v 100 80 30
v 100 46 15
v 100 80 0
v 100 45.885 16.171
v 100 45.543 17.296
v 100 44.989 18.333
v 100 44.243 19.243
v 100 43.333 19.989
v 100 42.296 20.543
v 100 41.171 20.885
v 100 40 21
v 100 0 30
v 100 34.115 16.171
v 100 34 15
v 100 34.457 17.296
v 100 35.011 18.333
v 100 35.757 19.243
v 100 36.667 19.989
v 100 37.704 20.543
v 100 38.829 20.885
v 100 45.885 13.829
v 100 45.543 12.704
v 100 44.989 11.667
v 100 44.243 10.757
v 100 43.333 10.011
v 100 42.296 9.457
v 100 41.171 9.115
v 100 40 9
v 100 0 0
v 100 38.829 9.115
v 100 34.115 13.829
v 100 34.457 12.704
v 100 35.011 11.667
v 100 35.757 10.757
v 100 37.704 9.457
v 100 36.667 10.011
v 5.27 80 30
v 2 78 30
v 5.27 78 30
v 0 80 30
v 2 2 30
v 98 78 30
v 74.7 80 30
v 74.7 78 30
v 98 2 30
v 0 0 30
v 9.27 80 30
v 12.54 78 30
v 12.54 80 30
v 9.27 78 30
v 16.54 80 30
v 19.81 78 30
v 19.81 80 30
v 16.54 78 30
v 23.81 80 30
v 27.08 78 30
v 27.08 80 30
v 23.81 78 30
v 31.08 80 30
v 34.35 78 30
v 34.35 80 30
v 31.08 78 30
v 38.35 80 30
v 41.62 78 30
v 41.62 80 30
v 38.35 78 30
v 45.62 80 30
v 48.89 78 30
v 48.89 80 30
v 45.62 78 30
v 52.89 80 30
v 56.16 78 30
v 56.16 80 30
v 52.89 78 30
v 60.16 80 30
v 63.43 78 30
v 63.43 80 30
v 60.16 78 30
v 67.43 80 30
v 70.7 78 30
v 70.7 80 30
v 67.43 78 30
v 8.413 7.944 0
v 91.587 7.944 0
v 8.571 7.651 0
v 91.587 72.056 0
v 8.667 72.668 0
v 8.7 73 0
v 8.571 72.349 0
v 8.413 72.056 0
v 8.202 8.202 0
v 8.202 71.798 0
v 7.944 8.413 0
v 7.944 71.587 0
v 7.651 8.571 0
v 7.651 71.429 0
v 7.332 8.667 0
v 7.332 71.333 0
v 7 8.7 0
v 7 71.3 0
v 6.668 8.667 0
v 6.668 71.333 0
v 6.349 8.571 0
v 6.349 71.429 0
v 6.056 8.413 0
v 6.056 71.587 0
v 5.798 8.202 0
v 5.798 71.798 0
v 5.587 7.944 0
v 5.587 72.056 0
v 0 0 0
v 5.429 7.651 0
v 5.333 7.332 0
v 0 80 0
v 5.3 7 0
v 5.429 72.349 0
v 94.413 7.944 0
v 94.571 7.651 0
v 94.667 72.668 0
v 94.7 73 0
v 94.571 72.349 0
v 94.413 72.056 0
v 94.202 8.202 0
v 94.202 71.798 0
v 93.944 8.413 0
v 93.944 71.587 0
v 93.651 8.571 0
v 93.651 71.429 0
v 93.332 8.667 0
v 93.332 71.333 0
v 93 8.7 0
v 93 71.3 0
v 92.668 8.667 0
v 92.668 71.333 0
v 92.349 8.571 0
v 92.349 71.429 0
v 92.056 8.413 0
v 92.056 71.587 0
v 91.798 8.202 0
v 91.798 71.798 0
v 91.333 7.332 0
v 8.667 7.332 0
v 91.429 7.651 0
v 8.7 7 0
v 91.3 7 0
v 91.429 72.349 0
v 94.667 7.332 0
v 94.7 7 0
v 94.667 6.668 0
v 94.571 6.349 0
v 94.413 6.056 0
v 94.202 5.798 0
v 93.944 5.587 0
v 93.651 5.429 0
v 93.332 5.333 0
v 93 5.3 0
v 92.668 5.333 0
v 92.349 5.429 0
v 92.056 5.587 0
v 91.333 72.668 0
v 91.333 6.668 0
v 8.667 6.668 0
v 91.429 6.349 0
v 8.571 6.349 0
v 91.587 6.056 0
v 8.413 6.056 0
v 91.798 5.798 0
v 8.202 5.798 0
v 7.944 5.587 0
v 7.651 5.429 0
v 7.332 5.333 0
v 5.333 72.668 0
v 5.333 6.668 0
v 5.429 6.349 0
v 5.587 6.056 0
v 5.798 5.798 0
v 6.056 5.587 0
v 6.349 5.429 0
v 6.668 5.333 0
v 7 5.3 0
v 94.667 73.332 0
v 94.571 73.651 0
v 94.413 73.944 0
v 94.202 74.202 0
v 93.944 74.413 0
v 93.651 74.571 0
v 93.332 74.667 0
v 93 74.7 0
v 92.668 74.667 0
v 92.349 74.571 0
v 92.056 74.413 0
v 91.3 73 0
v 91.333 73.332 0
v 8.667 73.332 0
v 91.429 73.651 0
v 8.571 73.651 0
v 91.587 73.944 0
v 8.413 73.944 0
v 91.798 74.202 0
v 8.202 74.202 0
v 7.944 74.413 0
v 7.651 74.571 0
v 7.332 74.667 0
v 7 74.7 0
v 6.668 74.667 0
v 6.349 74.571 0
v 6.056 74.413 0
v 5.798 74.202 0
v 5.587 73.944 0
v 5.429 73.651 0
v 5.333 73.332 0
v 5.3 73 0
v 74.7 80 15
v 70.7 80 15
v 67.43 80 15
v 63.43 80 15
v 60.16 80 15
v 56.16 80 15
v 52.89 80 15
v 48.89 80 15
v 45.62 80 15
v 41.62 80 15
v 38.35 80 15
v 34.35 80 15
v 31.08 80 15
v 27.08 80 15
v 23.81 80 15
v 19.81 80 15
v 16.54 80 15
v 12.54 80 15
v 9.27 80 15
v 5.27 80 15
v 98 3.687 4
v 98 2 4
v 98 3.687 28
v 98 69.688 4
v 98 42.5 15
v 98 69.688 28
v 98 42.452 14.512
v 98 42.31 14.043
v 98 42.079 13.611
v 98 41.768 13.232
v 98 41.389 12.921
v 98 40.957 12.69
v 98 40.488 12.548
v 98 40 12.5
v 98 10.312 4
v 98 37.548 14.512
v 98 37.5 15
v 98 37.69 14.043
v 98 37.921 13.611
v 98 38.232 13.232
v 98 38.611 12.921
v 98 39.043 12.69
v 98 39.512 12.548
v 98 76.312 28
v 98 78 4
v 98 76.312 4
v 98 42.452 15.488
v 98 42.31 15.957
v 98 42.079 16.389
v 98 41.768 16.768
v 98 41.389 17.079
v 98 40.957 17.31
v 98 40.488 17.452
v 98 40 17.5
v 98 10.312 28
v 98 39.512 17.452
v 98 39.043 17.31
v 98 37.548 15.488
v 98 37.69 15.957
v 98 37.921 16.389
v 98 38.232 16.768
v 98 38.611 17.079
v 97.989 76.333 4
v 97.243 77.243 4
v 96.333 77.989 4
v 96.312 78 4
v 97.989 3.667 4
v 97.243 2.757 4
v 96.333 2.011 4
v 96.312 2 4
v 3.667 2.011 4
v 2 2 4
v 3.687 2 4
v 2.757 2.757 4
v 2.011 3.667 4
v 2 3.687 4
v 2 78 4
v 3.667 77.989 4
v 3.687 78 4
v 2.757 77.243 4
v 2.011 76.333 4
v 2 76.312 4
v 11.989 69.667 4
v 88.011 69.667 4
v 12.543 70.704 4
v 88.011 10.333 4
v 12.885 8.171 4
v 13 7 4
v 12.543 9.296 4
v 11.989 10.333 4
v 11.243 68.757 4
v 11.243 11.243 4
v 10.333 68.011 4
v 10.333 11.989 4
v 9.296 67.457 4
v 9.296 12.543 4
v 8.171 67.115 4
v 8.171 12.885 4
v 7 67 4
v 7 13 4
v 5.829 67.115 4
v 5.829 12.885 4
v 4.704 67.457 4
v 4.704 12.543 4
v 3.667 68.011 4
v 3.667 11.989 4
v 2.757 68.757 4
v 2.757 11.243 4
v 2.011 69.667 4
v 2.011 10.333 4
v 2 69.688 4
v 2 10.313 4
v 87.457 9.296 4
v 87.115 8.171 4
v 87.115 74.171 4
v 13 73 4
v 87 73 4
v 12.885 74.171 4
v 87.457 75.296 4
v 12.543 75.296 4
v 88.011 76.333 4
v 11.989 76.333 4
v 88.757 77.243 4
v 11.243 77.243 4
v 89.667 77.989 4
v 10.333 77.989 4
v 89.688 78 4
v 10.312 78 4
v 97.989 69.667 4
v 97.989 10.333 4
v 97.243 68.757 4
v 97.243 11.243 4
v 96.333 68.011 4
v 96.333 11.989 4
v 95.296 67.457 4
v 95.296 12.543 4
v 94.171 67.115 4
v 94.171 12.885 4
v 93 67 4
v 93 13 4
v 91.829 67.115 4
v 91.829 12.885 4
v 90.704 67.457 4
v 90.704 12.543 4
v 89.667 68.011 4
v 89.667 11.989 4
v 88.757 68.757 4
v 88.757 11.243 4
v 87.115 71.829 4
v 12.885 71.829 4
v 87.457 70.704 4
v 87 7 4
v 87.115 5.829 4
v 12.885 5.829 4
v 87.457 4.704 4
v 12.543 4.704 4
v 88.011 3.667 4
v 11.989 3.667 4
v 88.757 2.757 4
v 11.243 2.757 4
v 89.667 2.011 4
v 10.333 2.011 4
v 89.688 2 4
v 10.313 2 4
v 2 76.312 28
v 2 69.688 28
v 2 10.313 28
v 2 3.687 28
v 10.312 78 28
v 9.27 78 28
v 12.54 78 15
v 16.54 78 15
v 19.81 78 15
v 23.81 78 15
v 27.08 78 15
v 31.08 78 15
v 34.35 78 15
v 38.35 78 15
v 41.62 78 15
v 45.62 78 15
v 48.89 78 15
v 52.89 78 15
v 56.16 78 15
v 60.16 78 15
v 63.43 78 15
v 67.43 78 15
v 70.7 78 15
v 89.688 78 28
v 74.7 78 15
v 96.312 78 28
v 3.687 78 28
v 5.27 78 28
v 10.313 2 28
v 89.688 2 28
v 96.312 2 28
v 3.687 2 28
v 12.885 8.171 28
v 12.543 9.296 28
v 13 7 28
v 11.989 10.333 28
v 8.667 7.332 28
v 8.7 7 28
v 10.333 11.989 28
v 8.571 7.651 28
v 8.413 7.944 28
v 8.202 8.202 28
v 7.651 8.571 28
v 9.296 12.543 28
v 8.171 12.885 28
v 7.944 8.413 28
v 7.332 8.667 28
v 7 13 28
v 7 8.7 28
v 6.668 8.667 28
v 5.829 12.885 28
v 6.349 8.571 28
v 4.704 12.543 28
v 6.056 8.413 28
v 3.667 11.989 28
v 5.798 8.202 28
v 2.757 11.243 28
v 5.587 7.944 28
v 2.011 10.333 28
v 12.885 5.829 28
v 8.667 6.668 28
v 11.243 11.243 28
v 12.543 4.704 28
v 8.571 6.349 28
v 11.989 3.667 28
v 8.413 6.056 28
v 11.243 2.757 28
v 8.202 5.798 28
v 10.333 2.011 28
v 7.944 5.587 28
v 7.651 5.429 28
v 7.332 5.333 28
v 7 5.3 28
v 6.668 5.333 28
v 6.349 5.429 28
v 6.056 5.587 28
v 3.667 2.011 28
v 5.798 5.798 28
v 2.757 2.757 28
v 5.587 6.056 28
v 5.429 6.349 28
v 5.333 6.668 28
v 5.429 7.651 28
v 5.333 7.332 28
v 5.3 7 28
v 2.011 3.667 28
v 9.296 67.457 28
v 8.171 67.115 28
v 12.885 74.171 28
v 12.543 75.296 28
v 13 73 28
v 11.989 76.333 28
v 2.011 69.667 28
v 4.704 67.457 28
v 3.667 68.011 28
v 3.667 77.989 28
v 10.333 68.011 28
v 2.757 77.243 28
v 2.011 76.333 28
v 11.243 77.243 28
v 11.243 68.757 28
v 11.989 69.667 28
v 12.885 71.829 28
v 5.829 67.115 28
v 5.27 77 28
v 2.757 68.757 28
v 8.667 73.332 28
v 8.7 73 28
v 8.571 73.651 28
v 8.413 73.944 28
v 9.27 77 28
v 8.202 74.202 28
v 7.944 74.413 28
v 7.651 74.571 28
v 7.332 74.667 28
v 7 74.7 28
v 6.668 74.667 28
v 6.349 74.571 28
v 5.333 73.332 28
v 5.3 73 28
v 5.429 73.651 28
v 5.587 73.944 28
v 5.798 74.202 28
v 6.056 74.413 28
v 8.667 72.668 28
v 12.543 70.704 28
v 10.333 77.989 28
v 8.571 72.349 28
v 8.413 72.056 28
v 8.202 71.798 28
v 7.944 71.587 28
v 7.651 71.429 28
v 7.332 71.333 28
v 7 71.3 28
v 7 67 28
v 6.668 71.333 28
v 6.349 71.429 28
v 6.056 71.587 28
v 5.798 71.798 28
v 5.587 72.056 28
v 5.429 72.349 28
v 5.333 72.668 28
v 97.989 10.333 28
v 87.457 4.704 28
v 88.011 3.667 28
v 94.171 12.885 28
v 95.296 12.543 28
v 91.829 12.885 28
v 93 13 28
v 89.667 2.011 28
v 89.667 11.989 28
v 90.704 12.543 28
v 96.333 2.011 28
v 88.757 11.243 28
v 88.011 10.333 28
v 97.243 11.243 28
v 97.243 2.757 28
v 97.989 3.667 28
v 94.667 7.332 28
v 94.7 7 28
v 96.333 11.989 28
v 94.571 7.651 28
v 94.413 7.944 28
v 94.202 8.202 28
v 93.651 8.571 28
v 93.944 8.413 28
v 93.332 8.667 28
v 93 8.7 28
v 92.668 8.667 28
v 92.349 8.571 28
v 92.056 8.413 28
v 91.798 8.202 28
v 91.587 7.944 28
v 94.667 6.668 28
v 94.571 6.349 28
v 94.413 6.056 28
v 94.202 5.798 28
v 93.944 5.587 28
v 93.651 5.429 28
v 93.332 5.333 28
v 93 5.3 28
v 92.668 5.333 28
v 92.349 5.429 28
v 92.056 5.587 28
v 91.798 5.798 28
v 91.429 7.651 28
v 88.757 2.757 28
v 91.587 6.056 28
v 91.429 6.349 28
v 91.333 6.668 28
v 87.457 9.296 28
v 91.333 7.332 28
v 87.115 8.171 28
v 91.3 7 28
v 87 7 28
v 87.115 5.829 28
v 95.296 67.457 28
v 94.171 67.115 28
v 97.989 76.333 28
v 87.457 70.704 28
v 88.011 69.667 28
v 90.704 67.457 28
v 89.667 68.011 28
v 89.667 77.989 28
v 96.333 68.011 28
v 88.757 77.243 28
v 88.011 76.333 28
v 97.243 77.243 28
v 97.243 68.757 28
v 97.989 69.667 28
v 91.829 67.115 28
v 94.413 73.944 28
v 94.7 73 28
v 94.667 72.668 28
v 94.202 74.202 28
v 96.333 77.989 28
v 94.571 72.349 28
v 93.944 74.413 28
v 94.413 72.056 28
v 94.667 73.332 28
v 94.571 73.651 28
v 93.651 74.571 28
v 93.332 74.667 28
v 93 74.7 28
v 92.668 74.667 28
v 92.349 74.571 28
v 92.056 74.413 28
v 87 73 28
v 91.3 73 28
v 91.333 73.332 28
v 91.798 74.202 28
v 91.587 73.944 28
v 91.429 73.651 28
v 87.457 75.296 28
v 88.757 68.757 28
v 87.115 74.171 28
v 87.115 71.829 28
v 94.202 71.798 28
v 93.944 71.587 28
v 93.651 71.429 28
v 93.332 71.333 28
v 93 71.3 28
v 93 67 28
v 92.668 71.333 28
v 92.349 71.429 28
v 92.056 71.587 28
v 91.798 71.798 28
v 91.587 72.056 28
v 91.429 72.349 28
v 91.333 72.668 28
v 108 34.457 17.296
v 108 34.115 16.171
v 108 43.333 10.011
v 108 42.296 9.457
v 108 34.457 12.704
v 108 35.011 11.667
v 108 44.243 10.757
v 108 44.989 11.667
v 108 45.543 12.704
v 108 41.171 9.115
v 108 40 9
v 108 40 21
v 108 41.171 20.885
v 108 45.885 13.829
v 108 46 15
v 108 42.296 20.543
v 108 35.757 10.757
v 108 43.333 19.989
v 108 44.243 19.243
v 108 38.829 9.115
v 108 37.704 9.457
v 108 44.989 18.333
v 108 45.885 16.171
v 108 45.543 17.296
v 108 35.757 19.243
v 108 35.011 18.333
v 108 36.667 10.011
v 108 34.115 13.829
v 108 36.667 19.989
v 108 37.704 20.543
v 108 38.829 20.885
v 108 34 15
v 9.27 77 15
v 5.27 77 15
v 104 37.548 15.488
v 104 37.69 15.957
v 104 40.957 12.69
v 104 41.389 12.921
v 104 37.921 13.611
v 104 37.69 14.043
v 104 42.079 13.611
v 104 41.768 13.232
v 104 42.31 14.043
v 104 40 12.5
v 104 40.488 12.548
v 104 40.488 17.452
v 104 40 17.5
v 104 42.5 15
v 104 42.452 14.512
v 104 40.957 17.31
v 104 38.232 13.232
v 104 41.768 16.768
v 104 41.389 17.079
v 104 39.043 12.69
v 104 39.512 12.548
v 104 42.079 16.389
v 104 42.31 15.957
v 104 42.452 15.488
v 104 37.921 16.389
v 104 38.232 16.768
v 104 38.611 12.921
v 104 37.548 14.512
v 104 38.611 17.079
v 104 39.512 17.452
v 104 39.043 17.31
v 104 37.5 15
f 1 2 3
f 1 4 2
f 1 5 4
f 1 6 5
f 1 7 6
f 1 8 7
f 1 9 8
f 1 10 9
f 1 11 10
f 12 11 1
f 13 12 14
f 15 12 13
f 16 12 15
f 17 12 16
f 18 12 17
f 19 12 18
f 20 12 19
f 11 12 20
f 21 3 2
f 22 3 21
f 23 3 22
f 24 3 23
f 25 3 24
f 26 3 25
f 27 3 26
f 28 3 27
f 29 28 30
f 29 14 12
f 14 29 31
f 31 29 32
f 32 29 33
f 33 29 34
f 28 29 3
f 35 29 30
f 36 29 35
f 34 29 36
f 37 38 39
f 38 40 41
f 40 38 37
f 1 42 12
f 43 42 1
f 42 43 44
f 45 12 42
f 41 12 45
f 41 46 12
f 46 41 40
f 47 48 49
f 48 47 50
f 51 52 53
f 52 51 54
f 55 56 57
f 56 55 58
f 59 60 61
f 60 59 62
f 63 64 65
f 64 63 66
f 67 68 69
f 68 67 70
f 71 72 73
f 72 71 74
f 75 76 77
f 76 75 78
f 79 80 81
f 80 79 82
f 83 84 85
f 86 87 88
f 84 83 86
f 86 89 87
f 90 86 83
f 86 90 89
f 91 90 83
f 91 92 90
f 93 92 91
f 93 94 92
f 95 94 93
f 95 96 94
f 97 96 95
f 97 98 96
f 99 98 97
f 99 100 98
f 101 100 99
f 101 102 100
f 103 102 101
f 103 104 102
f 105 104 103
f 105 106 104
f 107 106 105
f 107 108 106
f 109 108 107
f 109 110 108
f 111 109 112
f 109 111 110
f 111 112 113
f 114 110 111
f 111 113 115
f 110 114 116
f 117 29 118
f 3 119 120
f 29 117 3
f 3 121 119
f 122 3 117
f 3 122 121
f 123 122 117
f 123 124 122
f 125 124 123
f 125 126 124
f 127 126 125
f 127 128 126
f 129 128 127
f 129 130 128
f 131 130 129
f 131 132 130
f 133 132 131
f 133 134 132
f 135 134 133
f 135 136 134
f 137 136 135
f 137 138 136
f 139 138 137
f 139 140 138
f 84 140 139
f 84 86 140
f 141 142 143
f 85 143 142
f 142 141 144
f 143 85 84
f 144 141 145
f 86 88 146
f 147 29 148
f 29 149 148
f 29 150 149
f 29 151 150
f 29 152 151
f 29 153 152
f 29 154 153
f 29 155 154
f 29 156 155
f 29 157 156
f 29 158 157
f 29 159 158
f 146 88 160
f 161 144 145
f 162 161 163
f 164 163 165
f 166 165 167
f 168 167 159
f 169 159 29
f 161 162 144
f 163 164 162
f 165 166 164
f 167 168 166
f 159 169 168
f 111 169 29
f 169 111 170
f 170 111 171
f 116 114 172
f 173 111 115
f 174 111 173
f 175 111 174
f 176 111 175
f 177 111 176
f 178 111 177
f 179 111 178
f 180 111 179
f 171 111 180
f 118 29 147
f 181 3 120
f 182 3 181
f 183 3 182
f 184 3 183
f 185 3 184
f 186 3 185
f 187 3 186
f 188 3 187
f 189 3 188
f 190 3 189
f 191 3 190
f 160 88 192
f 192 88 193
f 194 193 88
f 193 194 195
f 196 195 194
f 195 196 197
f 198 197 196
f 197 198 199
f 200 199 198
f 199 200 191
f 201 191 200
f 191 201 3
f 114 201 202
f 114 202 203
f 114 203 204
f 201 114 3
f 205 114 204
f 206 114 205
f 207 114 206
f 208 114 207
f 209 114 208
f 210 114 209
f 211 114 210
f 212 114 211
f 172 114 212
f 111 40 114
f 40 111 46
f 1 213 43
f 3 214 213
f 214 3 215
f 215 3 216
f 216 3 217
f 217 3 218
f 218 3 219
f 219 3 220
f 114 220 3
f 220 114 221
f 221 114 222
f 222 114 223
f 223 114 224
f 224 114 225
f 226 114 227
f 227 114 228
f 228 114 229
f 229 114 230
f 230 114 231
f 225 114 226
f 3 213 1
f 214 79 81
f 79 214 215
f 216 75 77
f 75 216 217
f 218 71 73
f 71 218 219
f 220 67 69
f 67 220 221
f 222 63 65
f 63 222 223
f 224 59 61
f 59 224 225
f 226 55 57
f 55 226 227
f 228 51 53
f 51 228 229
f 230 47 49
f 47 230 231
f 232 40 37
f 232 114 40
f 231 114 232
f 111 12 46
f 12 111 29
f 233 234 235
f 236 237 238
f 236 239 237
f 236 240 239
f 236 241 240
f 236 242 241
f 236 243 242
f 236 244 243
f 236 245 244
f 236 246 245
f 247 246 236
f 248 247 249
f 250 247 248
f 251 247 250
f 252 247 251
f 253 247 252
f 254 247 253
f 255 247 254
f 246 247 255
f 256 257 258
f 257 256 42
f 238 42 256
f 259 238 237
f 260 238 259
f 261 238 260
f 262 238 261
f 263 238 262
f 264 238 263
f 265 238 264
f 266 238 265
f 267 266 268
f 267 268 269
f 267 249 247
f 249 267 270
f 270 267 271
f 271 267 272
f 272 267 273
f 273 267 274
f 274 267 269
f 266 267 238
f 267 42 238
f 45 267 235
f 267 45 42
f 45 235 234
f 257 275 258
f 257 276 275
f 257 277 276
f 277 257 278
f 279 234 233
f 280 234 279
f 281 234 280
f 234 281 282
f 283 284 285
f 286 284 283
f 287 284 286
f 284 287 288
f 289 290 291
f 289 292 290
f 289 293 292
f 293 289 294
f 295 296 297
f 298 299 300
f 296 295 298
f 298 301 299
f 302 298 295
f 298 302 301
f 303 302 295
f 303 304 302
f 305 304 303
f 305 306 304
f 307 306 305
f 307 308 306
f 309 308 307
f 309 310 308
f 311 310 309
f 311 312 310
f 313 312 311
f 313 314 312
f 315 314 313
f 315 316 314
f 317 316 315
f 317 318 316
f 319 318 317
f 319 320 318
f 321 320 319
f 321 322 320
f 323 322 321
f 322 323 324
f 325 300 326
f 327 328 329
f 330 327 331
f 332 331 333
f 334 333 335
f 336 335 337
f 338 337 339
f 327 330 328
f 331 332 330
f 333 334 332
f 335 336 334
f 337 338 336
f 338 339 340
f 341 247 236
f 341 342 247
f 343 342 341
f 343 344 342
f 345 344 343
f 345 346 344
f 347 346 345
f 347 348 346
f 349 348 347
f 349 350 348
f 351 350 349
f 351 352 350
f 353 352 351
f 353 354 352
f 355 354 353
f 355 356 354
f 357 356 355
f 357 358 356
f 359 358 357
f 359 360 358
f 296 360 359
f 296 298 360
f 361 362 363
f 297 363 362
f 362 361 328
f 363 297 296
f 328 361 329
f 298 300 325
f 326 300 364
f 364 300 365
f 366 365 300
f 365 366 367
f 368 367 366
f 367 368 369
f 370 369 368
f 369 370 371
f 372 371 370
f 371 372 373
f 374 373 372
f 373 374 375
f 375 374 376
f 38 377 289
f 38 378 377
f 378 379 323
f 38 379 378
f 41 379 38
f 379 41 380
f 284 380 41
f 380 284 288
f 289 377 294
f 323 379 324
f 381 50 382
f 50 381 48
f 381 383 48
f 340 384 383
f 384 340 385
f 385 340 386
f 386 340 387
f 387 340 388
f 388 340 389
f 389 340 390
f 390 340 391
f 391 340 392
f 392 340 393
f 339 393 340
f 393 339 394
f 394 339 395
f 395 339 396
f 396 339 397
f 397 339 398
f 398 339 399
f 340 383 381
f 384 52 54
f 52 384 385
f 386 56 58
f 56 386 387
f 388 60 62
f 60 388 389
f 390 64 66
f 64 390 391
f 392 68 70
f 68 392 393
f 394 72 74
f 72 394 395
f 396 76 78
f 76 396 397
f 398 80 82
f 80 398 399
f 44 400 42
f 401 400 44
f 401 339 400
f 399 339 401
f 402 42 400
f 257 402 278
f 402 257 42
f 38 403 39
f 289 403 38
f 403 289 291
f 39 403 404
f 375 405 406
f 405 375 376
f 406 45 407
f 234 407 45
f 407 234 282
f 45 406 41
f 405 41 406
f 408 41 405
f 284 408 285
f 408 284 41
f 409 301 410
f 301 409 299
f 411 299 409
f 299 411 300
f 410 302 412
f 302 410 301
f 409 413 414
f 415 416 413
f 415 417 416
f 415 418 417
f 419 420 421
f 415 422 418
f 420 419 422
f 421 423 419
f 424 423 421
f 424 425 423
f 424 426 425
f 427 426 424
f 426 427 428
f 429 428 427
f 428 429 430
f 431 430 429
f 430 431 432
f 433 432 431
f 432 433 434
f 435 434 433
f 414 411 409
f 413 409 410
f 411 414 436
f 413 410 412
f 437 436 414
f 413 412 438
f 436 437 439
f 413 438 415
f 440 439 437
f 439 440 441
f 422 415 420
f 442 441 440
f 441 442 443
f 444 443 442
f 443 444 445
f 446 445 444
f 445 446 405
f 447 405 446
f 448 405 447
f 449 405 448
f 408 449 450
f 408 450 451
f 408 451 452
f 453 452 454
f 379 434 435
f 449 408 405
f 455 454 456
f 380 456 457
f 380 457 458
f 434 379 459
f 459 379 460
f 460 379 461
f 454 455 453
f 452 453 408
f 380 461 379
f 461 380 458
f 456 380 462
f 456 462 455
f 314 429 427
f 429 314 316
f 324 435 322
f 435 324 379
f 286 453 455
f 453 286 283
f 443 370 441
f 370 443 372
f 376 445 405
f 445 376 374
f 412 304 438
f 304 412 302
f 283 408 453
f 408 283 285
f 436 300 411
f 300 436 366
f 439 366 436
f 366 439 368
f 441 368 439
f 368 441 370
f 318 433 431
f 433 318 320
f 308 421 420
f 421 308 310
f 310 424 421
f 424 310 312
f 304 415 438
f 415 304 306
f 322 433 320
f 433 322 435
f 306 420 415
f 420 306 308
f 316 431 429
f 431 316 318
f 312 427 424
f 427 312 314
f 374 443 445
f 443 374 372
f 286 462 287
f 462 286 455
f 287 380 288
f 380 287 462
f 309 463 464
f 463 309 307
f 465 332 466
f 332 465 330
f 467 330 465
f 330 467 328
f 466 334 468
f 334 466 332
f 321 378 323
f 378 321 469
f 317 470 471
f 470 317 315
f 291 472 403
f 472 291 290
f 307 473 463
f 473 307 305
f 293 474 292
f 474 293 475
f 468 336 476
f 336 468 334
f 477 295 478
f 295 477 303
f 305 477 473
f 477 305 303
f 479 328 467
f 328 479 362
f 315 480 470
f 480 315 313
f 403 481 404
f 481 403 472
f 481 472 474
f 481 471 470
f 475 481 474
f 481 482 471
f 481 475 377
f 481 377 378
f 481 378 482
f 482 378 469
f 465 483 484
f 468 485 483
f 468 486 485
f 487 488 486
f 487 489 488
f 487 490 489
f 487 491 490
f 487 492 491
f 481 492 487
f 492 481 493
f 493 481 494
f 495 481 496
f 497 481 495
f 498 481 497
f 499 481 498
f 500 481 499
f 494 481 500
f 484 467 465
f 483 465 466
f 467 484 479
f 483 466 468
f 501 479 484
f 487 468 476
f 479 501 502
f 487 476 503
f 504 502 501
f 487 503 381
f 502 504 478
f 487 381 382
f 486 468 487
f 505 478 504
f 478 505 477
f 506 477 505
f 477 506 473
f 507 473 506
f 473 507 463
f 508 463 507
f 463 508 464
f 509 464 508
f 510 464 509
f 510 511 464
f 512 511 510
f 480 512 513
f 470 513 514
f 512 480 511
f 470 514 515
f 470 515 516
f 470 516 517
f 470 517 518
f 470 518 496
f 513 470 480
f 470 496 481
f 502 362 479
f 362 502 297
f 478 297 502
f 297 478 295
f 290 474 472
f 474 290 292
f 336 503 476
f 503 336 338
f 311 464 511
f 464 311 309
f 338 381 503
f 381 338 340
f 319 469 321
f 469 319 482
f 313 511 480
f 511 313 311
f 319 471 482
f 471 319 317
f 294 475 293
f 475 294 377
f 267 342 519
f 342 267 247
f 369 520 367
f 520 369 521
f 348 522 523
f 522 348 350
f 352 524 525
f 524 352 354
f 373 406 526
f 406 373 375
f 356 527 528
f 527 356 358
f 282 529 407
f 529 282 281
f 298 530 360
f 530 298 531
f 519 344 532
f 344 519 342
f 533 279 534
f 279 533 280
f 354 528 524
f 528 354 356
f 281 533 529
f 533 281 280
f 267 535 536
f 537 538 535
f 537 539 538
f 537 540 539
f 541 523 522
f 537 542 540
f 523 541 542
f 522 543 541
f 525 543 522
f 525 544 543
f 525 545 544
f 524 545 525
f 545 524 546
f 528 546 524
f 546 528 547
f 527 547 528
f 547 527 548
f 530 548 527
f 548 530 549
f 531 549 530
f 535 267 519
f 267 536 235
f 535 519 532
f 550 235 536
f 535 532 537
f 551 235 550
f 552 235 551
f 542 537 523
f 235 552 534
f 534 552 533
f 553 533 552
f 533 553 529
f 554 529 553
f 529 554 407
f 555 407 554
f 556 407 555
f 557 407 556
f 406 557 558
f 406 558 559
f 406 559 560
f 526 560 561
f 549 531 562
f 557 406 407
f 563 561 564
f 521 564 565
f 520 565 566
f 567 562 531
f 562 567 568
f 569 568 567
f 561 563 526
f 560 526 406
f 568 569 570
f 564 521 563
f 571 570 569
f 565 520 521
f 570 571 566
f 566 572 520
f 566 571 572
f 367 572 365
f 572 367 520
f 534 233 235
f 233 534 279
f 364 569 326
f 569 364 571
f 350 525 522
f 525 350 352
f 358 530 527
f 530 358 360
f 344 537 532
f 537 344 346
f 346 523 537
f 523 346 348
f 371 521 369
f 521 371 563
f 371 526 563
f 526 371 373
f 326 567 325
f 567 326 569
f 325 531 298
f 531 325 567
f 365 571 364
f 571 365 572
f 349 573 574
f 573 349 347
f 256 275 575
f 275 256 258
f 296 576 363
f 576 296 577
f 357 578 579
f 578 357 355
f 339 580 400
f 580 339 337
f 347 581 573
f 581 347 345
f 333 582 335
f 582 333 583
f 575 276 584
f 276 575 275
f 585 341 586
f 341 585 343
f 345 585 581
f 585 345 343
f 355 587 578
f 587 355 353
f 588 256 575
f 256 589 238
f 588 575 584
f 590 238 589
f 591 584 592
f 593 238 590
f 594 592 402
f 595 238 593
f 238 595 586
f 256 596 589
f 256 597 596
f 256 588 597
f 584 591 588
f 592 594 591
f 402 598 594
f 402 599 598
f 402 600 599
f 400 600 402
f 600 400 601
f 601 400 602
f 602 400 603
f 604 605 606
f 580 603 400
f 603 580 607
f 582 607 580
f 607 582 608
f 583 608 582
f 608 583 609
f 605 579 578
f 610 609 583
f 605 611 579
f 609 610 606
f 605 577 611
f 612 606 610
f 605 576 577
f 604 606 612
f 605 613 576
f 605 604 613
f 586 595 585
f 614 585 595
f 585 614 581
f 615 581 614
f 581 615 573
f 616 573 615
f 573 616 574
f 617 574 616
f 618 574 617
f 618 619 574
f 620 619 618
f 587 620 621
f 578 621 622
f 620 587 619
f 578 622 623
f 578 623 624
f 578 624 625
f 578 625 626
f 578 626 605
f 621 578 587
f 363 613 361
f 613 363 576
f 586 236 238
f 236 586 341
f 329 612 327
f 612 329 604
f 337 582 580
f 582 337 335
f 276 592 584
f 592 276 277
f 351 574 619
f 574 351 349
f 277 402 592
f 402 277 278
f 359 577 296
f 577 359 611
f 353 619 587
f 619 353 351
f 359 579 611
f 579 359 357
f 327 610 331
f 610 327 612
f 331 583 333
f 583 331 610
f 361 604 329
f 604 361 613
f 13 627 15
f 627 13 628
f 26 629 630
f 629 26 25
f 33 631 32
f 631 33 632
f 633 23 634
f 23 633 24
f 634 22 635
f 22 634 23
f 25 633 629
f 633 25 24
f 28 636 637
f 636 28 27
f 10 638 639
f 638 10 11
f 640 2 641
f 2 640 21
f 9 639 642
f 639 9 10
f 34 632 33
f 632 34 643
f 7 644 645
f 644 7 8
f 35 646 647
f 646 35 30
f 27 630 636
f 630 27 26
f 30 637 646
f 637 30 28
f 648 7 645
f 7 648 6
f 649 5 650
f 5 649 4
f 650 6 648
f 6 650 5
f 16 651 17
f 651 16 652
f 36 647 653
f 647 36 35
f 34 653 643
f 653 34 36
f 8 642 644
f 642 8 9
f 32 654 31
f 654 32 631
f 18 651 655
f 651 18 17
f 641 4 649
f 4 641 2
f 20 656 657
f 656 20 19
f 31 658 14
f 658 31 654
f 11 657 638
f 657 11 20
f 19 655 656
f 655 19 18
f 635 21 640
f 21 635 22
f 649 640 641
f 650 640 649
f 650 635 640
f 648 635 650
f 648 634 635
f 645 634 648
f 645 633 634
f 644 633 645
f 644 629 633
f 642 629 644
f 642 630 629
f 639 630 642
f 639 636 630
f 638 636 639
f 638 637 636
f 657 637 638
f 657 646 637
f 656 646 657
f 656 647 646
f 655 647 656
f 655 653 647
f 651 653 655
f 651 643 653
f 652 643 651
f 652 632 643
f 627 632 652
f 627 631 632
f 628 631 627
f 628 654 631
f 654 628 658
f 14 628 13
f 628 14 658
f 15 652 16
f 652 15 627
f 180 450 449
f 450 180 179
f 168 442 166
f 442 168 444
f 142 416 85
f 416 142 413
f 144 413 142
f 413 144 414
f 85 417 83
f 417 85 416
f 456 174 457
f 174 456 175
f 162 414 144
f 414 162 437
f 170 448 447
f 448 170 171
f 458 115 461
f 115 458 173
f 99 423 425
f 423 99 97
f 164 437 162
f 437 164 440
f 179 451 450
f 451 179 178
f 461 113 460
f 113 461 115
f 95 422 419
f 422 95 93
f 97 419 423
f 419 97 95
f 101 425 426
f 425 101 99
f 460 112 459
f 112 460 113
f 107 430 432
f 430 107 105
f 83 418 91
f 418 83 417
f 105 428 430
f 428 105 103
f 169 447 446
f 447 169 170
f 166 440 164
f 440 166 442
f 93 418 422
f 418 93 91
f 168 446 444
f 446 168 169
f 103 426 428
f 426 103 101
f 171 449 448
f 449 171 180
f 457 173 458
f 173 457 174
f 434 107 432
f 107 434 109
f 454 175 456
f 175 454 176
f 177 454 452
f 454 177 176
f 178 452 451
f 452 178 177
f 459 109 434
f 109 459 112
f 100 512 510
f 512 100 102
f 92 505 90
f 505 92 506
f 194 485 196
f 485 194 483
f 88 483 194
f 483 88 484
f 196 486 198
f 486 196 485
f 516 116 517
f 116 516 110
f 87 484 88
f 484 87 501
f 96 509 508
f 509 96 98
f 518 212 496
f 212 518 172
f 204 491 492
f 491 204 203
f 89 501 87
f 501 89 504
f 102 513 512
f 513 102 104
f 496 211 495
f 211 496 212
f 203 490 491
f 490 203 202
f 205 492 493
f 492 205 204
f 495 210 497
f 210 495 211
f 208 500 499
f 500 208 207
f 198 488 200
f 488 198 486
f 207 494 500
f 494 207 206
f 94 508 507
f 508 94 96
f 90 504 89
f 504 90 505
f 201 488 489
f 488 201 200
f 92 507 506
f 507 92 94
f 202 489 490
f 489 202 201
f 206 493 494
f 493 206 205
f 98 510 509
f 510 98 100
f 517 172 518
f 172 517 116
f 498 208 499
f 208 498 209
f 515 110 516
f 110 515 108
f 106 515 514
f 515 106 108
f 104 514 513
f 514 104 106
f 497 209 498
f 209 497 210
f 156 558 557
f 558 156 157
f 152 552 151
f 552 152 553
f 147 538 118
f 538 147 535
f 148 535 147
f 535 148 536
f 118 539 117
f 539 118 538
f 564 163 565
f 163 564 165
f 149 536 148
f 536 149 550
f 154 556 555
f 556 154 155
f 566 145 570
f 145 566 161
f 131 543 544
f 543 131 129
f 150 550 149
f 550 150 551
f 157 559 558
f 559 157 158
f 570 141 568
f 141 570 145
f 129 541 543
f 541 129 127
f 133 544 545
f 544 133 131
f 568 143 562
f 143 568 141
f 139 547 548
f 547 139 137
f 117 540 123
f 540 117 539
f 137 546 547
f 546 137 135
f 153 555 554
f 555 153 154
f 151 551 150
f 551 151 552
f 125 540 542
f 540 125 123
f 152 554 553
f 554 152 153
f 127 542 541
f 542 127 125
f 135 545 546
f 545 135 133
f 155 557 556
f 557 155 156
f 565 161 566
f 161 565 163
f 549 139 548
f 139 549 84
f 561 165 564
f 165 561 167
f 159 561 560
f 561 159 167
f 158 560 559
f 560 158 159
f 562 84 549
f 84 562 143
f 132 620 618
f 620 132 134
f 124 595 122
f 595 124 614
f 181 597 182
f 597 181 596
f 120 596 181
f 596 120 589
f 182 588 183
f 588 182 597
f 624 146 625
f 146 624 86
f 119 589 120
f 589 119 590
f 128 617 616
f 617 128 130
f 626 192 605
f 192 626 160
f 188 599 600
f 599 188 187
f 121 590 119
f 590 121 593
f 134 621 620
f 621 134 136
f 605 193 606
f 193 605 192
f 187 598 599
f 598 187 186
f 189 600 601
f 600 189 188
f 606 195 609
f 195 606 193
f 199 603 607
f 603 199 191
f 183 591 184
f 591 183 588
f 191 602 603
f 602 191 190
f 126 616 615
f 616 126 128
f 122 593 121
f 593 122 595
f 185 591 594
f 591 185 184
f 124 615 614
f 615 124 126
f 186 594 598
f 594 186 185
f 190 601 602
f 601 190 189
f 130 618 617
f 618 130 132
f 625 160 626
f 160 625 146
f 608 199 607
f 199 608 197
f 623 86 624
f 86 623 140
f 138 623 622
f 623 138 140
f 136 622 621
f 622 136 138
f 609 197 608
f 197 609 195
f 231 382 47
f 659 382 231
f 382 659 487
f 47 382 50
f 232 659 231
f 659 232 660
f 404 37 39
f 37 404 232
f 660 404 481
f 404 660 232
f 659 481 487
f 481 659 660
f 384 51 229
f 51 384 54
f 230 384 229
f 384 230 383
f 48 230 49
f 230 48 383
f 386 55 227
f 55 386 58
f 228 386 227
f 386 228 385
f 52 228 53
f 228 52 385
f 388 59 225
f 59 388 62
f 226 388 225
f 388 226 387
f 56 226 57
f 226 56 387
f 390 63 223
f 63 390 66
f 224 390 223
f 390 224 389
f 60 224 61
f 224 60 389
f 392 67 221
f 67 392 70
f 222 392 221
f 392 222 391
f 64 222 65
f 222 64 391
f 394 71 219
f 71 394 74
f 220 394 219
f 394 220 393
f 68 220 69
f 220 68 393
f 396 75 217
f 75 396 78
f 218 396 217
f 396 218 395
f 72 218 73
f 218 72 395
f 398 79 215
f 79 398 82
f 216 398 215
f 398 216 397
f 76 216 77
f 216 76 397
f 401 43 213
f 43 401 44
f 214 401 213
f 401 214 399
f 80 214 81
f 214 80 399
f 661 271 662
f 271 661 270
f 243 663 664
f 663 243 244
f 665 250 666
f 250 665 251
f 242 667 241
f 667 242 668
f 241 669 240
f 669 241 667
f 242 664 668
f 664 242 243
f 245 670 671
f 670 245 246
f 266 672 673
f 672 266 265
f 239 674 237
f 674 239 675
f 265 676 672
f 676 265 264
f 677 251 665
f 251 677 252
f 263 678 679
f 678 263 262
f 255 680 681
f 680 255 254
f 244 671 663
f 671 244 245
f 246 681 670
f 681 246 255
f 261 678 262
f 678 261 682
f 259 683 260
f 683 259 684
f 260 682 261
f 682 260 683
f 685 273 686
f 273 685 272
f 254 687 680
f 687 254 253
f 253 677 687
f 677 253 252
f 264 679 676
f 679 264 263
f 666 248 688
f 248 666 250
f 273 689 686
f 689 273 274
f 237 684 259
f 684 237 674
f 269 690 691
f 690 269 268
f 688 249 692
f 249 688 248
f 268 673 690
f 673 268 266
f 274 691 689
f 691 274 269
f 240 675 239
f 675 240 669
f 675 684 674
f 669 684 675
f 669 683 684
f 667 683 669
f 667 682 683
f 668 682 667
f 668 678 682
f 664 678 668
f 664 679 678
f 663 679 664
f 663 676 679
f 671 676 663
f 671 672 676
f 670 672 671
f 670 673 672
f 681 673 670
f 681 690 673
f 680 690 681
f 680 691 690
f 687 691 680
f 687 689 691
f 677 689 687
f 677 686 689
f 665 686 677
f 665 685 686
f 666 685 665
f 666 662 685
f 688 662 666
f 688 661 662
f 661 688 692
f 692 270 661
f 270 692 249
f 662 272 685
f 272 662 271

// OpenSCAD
$fn = 32;

// ----------------------------------------------------------------------
// Enclosure body: 100 x 80 x 30 mm, wall 2 mm
// ----------------------------------------------------------------------

// --- parameters (mm) ---
length = 100;             // outside length, X
width = 80;               // outside width, Y
height = 30;              // outside height, Z
wall = 2;                 // side wall thickness
floor_t = 4;              // floor thickness
boss_d = 12;              // corner boss diameter
boss_h = 24;              // corner boss height above the floor
boss_hole_d = 3.4;        // lid screw clearance in the boss
boss_lip = 7;             // boss centre inset from the corner
vent_slots = 10;          // vent slots in the long wall
vent_w = 4;               // vent slot width
vent_h = 16;              // vent slot height
vent_pitch = 7.27;        // vent slot pitch
vent_z = 15;              // vent slot sill height
nipple_d = 12;            // cable gland boss diameter
nipple_h = 8;             // cable gland boss height
nipple_bore = 5;          // cable gland bore

module shell() {
  difference() {
    cube([length, width, height]);
    /* hollow, open at the top */
    translate([wall, wall, floor_t])
      cube([length - 2 * wall, width - 2 * wall, height]);
  }
}

module bosses() {
  /* corner bosses, sunk 1 mm into the floor */
  for (sx = [0, 1]) for (sy = [0, 1])
    translate([sx * (length - 2 * boss_lip) + boss_lip, sy * (width - 2 * boss_lip) + boss_lip, floor_t - 1])
      cylinder(h = boss_h + 1, d = boss_d);
}

module gland() {
  /* boss on the short wall, sunk 1 mm into it */
  translate([length - 1, width / 2, height * 0.5]) rotate([0, 90, 0])
    cylinder(h = nipple_h + 1, d = nipple_d);
}

difference() {
  union() {
    shell();
    bosses();
    gland();
  }
  /* boss screw holes */
  for (sx = [0, 1]) for (sy = [0, 1])
    translate([sx * (length - 2 * boss_lip) + boss_lip, sy * (width - 2 * boss_lip) + boss_lip, -1]) cylinder(h = floor_t + boss_h + 2, d = boss_hole_d);
  /* vent grille in the +Y wall */
  for (i = [0 : vent_slots - 1]) translate([vent_pitch * (i + 1) - vent_w / 2, width - wall - 1, vent_z]) cube([vent_w, wall + 2, vent_h]);
  translate([length, width / 2, height * 0.5]) rotate([0, 90, 0]) translate([0, 0, -nipple_h - 2]) cylinder(h = nipple_h + wall + 4, d = nipple_bore);
}
